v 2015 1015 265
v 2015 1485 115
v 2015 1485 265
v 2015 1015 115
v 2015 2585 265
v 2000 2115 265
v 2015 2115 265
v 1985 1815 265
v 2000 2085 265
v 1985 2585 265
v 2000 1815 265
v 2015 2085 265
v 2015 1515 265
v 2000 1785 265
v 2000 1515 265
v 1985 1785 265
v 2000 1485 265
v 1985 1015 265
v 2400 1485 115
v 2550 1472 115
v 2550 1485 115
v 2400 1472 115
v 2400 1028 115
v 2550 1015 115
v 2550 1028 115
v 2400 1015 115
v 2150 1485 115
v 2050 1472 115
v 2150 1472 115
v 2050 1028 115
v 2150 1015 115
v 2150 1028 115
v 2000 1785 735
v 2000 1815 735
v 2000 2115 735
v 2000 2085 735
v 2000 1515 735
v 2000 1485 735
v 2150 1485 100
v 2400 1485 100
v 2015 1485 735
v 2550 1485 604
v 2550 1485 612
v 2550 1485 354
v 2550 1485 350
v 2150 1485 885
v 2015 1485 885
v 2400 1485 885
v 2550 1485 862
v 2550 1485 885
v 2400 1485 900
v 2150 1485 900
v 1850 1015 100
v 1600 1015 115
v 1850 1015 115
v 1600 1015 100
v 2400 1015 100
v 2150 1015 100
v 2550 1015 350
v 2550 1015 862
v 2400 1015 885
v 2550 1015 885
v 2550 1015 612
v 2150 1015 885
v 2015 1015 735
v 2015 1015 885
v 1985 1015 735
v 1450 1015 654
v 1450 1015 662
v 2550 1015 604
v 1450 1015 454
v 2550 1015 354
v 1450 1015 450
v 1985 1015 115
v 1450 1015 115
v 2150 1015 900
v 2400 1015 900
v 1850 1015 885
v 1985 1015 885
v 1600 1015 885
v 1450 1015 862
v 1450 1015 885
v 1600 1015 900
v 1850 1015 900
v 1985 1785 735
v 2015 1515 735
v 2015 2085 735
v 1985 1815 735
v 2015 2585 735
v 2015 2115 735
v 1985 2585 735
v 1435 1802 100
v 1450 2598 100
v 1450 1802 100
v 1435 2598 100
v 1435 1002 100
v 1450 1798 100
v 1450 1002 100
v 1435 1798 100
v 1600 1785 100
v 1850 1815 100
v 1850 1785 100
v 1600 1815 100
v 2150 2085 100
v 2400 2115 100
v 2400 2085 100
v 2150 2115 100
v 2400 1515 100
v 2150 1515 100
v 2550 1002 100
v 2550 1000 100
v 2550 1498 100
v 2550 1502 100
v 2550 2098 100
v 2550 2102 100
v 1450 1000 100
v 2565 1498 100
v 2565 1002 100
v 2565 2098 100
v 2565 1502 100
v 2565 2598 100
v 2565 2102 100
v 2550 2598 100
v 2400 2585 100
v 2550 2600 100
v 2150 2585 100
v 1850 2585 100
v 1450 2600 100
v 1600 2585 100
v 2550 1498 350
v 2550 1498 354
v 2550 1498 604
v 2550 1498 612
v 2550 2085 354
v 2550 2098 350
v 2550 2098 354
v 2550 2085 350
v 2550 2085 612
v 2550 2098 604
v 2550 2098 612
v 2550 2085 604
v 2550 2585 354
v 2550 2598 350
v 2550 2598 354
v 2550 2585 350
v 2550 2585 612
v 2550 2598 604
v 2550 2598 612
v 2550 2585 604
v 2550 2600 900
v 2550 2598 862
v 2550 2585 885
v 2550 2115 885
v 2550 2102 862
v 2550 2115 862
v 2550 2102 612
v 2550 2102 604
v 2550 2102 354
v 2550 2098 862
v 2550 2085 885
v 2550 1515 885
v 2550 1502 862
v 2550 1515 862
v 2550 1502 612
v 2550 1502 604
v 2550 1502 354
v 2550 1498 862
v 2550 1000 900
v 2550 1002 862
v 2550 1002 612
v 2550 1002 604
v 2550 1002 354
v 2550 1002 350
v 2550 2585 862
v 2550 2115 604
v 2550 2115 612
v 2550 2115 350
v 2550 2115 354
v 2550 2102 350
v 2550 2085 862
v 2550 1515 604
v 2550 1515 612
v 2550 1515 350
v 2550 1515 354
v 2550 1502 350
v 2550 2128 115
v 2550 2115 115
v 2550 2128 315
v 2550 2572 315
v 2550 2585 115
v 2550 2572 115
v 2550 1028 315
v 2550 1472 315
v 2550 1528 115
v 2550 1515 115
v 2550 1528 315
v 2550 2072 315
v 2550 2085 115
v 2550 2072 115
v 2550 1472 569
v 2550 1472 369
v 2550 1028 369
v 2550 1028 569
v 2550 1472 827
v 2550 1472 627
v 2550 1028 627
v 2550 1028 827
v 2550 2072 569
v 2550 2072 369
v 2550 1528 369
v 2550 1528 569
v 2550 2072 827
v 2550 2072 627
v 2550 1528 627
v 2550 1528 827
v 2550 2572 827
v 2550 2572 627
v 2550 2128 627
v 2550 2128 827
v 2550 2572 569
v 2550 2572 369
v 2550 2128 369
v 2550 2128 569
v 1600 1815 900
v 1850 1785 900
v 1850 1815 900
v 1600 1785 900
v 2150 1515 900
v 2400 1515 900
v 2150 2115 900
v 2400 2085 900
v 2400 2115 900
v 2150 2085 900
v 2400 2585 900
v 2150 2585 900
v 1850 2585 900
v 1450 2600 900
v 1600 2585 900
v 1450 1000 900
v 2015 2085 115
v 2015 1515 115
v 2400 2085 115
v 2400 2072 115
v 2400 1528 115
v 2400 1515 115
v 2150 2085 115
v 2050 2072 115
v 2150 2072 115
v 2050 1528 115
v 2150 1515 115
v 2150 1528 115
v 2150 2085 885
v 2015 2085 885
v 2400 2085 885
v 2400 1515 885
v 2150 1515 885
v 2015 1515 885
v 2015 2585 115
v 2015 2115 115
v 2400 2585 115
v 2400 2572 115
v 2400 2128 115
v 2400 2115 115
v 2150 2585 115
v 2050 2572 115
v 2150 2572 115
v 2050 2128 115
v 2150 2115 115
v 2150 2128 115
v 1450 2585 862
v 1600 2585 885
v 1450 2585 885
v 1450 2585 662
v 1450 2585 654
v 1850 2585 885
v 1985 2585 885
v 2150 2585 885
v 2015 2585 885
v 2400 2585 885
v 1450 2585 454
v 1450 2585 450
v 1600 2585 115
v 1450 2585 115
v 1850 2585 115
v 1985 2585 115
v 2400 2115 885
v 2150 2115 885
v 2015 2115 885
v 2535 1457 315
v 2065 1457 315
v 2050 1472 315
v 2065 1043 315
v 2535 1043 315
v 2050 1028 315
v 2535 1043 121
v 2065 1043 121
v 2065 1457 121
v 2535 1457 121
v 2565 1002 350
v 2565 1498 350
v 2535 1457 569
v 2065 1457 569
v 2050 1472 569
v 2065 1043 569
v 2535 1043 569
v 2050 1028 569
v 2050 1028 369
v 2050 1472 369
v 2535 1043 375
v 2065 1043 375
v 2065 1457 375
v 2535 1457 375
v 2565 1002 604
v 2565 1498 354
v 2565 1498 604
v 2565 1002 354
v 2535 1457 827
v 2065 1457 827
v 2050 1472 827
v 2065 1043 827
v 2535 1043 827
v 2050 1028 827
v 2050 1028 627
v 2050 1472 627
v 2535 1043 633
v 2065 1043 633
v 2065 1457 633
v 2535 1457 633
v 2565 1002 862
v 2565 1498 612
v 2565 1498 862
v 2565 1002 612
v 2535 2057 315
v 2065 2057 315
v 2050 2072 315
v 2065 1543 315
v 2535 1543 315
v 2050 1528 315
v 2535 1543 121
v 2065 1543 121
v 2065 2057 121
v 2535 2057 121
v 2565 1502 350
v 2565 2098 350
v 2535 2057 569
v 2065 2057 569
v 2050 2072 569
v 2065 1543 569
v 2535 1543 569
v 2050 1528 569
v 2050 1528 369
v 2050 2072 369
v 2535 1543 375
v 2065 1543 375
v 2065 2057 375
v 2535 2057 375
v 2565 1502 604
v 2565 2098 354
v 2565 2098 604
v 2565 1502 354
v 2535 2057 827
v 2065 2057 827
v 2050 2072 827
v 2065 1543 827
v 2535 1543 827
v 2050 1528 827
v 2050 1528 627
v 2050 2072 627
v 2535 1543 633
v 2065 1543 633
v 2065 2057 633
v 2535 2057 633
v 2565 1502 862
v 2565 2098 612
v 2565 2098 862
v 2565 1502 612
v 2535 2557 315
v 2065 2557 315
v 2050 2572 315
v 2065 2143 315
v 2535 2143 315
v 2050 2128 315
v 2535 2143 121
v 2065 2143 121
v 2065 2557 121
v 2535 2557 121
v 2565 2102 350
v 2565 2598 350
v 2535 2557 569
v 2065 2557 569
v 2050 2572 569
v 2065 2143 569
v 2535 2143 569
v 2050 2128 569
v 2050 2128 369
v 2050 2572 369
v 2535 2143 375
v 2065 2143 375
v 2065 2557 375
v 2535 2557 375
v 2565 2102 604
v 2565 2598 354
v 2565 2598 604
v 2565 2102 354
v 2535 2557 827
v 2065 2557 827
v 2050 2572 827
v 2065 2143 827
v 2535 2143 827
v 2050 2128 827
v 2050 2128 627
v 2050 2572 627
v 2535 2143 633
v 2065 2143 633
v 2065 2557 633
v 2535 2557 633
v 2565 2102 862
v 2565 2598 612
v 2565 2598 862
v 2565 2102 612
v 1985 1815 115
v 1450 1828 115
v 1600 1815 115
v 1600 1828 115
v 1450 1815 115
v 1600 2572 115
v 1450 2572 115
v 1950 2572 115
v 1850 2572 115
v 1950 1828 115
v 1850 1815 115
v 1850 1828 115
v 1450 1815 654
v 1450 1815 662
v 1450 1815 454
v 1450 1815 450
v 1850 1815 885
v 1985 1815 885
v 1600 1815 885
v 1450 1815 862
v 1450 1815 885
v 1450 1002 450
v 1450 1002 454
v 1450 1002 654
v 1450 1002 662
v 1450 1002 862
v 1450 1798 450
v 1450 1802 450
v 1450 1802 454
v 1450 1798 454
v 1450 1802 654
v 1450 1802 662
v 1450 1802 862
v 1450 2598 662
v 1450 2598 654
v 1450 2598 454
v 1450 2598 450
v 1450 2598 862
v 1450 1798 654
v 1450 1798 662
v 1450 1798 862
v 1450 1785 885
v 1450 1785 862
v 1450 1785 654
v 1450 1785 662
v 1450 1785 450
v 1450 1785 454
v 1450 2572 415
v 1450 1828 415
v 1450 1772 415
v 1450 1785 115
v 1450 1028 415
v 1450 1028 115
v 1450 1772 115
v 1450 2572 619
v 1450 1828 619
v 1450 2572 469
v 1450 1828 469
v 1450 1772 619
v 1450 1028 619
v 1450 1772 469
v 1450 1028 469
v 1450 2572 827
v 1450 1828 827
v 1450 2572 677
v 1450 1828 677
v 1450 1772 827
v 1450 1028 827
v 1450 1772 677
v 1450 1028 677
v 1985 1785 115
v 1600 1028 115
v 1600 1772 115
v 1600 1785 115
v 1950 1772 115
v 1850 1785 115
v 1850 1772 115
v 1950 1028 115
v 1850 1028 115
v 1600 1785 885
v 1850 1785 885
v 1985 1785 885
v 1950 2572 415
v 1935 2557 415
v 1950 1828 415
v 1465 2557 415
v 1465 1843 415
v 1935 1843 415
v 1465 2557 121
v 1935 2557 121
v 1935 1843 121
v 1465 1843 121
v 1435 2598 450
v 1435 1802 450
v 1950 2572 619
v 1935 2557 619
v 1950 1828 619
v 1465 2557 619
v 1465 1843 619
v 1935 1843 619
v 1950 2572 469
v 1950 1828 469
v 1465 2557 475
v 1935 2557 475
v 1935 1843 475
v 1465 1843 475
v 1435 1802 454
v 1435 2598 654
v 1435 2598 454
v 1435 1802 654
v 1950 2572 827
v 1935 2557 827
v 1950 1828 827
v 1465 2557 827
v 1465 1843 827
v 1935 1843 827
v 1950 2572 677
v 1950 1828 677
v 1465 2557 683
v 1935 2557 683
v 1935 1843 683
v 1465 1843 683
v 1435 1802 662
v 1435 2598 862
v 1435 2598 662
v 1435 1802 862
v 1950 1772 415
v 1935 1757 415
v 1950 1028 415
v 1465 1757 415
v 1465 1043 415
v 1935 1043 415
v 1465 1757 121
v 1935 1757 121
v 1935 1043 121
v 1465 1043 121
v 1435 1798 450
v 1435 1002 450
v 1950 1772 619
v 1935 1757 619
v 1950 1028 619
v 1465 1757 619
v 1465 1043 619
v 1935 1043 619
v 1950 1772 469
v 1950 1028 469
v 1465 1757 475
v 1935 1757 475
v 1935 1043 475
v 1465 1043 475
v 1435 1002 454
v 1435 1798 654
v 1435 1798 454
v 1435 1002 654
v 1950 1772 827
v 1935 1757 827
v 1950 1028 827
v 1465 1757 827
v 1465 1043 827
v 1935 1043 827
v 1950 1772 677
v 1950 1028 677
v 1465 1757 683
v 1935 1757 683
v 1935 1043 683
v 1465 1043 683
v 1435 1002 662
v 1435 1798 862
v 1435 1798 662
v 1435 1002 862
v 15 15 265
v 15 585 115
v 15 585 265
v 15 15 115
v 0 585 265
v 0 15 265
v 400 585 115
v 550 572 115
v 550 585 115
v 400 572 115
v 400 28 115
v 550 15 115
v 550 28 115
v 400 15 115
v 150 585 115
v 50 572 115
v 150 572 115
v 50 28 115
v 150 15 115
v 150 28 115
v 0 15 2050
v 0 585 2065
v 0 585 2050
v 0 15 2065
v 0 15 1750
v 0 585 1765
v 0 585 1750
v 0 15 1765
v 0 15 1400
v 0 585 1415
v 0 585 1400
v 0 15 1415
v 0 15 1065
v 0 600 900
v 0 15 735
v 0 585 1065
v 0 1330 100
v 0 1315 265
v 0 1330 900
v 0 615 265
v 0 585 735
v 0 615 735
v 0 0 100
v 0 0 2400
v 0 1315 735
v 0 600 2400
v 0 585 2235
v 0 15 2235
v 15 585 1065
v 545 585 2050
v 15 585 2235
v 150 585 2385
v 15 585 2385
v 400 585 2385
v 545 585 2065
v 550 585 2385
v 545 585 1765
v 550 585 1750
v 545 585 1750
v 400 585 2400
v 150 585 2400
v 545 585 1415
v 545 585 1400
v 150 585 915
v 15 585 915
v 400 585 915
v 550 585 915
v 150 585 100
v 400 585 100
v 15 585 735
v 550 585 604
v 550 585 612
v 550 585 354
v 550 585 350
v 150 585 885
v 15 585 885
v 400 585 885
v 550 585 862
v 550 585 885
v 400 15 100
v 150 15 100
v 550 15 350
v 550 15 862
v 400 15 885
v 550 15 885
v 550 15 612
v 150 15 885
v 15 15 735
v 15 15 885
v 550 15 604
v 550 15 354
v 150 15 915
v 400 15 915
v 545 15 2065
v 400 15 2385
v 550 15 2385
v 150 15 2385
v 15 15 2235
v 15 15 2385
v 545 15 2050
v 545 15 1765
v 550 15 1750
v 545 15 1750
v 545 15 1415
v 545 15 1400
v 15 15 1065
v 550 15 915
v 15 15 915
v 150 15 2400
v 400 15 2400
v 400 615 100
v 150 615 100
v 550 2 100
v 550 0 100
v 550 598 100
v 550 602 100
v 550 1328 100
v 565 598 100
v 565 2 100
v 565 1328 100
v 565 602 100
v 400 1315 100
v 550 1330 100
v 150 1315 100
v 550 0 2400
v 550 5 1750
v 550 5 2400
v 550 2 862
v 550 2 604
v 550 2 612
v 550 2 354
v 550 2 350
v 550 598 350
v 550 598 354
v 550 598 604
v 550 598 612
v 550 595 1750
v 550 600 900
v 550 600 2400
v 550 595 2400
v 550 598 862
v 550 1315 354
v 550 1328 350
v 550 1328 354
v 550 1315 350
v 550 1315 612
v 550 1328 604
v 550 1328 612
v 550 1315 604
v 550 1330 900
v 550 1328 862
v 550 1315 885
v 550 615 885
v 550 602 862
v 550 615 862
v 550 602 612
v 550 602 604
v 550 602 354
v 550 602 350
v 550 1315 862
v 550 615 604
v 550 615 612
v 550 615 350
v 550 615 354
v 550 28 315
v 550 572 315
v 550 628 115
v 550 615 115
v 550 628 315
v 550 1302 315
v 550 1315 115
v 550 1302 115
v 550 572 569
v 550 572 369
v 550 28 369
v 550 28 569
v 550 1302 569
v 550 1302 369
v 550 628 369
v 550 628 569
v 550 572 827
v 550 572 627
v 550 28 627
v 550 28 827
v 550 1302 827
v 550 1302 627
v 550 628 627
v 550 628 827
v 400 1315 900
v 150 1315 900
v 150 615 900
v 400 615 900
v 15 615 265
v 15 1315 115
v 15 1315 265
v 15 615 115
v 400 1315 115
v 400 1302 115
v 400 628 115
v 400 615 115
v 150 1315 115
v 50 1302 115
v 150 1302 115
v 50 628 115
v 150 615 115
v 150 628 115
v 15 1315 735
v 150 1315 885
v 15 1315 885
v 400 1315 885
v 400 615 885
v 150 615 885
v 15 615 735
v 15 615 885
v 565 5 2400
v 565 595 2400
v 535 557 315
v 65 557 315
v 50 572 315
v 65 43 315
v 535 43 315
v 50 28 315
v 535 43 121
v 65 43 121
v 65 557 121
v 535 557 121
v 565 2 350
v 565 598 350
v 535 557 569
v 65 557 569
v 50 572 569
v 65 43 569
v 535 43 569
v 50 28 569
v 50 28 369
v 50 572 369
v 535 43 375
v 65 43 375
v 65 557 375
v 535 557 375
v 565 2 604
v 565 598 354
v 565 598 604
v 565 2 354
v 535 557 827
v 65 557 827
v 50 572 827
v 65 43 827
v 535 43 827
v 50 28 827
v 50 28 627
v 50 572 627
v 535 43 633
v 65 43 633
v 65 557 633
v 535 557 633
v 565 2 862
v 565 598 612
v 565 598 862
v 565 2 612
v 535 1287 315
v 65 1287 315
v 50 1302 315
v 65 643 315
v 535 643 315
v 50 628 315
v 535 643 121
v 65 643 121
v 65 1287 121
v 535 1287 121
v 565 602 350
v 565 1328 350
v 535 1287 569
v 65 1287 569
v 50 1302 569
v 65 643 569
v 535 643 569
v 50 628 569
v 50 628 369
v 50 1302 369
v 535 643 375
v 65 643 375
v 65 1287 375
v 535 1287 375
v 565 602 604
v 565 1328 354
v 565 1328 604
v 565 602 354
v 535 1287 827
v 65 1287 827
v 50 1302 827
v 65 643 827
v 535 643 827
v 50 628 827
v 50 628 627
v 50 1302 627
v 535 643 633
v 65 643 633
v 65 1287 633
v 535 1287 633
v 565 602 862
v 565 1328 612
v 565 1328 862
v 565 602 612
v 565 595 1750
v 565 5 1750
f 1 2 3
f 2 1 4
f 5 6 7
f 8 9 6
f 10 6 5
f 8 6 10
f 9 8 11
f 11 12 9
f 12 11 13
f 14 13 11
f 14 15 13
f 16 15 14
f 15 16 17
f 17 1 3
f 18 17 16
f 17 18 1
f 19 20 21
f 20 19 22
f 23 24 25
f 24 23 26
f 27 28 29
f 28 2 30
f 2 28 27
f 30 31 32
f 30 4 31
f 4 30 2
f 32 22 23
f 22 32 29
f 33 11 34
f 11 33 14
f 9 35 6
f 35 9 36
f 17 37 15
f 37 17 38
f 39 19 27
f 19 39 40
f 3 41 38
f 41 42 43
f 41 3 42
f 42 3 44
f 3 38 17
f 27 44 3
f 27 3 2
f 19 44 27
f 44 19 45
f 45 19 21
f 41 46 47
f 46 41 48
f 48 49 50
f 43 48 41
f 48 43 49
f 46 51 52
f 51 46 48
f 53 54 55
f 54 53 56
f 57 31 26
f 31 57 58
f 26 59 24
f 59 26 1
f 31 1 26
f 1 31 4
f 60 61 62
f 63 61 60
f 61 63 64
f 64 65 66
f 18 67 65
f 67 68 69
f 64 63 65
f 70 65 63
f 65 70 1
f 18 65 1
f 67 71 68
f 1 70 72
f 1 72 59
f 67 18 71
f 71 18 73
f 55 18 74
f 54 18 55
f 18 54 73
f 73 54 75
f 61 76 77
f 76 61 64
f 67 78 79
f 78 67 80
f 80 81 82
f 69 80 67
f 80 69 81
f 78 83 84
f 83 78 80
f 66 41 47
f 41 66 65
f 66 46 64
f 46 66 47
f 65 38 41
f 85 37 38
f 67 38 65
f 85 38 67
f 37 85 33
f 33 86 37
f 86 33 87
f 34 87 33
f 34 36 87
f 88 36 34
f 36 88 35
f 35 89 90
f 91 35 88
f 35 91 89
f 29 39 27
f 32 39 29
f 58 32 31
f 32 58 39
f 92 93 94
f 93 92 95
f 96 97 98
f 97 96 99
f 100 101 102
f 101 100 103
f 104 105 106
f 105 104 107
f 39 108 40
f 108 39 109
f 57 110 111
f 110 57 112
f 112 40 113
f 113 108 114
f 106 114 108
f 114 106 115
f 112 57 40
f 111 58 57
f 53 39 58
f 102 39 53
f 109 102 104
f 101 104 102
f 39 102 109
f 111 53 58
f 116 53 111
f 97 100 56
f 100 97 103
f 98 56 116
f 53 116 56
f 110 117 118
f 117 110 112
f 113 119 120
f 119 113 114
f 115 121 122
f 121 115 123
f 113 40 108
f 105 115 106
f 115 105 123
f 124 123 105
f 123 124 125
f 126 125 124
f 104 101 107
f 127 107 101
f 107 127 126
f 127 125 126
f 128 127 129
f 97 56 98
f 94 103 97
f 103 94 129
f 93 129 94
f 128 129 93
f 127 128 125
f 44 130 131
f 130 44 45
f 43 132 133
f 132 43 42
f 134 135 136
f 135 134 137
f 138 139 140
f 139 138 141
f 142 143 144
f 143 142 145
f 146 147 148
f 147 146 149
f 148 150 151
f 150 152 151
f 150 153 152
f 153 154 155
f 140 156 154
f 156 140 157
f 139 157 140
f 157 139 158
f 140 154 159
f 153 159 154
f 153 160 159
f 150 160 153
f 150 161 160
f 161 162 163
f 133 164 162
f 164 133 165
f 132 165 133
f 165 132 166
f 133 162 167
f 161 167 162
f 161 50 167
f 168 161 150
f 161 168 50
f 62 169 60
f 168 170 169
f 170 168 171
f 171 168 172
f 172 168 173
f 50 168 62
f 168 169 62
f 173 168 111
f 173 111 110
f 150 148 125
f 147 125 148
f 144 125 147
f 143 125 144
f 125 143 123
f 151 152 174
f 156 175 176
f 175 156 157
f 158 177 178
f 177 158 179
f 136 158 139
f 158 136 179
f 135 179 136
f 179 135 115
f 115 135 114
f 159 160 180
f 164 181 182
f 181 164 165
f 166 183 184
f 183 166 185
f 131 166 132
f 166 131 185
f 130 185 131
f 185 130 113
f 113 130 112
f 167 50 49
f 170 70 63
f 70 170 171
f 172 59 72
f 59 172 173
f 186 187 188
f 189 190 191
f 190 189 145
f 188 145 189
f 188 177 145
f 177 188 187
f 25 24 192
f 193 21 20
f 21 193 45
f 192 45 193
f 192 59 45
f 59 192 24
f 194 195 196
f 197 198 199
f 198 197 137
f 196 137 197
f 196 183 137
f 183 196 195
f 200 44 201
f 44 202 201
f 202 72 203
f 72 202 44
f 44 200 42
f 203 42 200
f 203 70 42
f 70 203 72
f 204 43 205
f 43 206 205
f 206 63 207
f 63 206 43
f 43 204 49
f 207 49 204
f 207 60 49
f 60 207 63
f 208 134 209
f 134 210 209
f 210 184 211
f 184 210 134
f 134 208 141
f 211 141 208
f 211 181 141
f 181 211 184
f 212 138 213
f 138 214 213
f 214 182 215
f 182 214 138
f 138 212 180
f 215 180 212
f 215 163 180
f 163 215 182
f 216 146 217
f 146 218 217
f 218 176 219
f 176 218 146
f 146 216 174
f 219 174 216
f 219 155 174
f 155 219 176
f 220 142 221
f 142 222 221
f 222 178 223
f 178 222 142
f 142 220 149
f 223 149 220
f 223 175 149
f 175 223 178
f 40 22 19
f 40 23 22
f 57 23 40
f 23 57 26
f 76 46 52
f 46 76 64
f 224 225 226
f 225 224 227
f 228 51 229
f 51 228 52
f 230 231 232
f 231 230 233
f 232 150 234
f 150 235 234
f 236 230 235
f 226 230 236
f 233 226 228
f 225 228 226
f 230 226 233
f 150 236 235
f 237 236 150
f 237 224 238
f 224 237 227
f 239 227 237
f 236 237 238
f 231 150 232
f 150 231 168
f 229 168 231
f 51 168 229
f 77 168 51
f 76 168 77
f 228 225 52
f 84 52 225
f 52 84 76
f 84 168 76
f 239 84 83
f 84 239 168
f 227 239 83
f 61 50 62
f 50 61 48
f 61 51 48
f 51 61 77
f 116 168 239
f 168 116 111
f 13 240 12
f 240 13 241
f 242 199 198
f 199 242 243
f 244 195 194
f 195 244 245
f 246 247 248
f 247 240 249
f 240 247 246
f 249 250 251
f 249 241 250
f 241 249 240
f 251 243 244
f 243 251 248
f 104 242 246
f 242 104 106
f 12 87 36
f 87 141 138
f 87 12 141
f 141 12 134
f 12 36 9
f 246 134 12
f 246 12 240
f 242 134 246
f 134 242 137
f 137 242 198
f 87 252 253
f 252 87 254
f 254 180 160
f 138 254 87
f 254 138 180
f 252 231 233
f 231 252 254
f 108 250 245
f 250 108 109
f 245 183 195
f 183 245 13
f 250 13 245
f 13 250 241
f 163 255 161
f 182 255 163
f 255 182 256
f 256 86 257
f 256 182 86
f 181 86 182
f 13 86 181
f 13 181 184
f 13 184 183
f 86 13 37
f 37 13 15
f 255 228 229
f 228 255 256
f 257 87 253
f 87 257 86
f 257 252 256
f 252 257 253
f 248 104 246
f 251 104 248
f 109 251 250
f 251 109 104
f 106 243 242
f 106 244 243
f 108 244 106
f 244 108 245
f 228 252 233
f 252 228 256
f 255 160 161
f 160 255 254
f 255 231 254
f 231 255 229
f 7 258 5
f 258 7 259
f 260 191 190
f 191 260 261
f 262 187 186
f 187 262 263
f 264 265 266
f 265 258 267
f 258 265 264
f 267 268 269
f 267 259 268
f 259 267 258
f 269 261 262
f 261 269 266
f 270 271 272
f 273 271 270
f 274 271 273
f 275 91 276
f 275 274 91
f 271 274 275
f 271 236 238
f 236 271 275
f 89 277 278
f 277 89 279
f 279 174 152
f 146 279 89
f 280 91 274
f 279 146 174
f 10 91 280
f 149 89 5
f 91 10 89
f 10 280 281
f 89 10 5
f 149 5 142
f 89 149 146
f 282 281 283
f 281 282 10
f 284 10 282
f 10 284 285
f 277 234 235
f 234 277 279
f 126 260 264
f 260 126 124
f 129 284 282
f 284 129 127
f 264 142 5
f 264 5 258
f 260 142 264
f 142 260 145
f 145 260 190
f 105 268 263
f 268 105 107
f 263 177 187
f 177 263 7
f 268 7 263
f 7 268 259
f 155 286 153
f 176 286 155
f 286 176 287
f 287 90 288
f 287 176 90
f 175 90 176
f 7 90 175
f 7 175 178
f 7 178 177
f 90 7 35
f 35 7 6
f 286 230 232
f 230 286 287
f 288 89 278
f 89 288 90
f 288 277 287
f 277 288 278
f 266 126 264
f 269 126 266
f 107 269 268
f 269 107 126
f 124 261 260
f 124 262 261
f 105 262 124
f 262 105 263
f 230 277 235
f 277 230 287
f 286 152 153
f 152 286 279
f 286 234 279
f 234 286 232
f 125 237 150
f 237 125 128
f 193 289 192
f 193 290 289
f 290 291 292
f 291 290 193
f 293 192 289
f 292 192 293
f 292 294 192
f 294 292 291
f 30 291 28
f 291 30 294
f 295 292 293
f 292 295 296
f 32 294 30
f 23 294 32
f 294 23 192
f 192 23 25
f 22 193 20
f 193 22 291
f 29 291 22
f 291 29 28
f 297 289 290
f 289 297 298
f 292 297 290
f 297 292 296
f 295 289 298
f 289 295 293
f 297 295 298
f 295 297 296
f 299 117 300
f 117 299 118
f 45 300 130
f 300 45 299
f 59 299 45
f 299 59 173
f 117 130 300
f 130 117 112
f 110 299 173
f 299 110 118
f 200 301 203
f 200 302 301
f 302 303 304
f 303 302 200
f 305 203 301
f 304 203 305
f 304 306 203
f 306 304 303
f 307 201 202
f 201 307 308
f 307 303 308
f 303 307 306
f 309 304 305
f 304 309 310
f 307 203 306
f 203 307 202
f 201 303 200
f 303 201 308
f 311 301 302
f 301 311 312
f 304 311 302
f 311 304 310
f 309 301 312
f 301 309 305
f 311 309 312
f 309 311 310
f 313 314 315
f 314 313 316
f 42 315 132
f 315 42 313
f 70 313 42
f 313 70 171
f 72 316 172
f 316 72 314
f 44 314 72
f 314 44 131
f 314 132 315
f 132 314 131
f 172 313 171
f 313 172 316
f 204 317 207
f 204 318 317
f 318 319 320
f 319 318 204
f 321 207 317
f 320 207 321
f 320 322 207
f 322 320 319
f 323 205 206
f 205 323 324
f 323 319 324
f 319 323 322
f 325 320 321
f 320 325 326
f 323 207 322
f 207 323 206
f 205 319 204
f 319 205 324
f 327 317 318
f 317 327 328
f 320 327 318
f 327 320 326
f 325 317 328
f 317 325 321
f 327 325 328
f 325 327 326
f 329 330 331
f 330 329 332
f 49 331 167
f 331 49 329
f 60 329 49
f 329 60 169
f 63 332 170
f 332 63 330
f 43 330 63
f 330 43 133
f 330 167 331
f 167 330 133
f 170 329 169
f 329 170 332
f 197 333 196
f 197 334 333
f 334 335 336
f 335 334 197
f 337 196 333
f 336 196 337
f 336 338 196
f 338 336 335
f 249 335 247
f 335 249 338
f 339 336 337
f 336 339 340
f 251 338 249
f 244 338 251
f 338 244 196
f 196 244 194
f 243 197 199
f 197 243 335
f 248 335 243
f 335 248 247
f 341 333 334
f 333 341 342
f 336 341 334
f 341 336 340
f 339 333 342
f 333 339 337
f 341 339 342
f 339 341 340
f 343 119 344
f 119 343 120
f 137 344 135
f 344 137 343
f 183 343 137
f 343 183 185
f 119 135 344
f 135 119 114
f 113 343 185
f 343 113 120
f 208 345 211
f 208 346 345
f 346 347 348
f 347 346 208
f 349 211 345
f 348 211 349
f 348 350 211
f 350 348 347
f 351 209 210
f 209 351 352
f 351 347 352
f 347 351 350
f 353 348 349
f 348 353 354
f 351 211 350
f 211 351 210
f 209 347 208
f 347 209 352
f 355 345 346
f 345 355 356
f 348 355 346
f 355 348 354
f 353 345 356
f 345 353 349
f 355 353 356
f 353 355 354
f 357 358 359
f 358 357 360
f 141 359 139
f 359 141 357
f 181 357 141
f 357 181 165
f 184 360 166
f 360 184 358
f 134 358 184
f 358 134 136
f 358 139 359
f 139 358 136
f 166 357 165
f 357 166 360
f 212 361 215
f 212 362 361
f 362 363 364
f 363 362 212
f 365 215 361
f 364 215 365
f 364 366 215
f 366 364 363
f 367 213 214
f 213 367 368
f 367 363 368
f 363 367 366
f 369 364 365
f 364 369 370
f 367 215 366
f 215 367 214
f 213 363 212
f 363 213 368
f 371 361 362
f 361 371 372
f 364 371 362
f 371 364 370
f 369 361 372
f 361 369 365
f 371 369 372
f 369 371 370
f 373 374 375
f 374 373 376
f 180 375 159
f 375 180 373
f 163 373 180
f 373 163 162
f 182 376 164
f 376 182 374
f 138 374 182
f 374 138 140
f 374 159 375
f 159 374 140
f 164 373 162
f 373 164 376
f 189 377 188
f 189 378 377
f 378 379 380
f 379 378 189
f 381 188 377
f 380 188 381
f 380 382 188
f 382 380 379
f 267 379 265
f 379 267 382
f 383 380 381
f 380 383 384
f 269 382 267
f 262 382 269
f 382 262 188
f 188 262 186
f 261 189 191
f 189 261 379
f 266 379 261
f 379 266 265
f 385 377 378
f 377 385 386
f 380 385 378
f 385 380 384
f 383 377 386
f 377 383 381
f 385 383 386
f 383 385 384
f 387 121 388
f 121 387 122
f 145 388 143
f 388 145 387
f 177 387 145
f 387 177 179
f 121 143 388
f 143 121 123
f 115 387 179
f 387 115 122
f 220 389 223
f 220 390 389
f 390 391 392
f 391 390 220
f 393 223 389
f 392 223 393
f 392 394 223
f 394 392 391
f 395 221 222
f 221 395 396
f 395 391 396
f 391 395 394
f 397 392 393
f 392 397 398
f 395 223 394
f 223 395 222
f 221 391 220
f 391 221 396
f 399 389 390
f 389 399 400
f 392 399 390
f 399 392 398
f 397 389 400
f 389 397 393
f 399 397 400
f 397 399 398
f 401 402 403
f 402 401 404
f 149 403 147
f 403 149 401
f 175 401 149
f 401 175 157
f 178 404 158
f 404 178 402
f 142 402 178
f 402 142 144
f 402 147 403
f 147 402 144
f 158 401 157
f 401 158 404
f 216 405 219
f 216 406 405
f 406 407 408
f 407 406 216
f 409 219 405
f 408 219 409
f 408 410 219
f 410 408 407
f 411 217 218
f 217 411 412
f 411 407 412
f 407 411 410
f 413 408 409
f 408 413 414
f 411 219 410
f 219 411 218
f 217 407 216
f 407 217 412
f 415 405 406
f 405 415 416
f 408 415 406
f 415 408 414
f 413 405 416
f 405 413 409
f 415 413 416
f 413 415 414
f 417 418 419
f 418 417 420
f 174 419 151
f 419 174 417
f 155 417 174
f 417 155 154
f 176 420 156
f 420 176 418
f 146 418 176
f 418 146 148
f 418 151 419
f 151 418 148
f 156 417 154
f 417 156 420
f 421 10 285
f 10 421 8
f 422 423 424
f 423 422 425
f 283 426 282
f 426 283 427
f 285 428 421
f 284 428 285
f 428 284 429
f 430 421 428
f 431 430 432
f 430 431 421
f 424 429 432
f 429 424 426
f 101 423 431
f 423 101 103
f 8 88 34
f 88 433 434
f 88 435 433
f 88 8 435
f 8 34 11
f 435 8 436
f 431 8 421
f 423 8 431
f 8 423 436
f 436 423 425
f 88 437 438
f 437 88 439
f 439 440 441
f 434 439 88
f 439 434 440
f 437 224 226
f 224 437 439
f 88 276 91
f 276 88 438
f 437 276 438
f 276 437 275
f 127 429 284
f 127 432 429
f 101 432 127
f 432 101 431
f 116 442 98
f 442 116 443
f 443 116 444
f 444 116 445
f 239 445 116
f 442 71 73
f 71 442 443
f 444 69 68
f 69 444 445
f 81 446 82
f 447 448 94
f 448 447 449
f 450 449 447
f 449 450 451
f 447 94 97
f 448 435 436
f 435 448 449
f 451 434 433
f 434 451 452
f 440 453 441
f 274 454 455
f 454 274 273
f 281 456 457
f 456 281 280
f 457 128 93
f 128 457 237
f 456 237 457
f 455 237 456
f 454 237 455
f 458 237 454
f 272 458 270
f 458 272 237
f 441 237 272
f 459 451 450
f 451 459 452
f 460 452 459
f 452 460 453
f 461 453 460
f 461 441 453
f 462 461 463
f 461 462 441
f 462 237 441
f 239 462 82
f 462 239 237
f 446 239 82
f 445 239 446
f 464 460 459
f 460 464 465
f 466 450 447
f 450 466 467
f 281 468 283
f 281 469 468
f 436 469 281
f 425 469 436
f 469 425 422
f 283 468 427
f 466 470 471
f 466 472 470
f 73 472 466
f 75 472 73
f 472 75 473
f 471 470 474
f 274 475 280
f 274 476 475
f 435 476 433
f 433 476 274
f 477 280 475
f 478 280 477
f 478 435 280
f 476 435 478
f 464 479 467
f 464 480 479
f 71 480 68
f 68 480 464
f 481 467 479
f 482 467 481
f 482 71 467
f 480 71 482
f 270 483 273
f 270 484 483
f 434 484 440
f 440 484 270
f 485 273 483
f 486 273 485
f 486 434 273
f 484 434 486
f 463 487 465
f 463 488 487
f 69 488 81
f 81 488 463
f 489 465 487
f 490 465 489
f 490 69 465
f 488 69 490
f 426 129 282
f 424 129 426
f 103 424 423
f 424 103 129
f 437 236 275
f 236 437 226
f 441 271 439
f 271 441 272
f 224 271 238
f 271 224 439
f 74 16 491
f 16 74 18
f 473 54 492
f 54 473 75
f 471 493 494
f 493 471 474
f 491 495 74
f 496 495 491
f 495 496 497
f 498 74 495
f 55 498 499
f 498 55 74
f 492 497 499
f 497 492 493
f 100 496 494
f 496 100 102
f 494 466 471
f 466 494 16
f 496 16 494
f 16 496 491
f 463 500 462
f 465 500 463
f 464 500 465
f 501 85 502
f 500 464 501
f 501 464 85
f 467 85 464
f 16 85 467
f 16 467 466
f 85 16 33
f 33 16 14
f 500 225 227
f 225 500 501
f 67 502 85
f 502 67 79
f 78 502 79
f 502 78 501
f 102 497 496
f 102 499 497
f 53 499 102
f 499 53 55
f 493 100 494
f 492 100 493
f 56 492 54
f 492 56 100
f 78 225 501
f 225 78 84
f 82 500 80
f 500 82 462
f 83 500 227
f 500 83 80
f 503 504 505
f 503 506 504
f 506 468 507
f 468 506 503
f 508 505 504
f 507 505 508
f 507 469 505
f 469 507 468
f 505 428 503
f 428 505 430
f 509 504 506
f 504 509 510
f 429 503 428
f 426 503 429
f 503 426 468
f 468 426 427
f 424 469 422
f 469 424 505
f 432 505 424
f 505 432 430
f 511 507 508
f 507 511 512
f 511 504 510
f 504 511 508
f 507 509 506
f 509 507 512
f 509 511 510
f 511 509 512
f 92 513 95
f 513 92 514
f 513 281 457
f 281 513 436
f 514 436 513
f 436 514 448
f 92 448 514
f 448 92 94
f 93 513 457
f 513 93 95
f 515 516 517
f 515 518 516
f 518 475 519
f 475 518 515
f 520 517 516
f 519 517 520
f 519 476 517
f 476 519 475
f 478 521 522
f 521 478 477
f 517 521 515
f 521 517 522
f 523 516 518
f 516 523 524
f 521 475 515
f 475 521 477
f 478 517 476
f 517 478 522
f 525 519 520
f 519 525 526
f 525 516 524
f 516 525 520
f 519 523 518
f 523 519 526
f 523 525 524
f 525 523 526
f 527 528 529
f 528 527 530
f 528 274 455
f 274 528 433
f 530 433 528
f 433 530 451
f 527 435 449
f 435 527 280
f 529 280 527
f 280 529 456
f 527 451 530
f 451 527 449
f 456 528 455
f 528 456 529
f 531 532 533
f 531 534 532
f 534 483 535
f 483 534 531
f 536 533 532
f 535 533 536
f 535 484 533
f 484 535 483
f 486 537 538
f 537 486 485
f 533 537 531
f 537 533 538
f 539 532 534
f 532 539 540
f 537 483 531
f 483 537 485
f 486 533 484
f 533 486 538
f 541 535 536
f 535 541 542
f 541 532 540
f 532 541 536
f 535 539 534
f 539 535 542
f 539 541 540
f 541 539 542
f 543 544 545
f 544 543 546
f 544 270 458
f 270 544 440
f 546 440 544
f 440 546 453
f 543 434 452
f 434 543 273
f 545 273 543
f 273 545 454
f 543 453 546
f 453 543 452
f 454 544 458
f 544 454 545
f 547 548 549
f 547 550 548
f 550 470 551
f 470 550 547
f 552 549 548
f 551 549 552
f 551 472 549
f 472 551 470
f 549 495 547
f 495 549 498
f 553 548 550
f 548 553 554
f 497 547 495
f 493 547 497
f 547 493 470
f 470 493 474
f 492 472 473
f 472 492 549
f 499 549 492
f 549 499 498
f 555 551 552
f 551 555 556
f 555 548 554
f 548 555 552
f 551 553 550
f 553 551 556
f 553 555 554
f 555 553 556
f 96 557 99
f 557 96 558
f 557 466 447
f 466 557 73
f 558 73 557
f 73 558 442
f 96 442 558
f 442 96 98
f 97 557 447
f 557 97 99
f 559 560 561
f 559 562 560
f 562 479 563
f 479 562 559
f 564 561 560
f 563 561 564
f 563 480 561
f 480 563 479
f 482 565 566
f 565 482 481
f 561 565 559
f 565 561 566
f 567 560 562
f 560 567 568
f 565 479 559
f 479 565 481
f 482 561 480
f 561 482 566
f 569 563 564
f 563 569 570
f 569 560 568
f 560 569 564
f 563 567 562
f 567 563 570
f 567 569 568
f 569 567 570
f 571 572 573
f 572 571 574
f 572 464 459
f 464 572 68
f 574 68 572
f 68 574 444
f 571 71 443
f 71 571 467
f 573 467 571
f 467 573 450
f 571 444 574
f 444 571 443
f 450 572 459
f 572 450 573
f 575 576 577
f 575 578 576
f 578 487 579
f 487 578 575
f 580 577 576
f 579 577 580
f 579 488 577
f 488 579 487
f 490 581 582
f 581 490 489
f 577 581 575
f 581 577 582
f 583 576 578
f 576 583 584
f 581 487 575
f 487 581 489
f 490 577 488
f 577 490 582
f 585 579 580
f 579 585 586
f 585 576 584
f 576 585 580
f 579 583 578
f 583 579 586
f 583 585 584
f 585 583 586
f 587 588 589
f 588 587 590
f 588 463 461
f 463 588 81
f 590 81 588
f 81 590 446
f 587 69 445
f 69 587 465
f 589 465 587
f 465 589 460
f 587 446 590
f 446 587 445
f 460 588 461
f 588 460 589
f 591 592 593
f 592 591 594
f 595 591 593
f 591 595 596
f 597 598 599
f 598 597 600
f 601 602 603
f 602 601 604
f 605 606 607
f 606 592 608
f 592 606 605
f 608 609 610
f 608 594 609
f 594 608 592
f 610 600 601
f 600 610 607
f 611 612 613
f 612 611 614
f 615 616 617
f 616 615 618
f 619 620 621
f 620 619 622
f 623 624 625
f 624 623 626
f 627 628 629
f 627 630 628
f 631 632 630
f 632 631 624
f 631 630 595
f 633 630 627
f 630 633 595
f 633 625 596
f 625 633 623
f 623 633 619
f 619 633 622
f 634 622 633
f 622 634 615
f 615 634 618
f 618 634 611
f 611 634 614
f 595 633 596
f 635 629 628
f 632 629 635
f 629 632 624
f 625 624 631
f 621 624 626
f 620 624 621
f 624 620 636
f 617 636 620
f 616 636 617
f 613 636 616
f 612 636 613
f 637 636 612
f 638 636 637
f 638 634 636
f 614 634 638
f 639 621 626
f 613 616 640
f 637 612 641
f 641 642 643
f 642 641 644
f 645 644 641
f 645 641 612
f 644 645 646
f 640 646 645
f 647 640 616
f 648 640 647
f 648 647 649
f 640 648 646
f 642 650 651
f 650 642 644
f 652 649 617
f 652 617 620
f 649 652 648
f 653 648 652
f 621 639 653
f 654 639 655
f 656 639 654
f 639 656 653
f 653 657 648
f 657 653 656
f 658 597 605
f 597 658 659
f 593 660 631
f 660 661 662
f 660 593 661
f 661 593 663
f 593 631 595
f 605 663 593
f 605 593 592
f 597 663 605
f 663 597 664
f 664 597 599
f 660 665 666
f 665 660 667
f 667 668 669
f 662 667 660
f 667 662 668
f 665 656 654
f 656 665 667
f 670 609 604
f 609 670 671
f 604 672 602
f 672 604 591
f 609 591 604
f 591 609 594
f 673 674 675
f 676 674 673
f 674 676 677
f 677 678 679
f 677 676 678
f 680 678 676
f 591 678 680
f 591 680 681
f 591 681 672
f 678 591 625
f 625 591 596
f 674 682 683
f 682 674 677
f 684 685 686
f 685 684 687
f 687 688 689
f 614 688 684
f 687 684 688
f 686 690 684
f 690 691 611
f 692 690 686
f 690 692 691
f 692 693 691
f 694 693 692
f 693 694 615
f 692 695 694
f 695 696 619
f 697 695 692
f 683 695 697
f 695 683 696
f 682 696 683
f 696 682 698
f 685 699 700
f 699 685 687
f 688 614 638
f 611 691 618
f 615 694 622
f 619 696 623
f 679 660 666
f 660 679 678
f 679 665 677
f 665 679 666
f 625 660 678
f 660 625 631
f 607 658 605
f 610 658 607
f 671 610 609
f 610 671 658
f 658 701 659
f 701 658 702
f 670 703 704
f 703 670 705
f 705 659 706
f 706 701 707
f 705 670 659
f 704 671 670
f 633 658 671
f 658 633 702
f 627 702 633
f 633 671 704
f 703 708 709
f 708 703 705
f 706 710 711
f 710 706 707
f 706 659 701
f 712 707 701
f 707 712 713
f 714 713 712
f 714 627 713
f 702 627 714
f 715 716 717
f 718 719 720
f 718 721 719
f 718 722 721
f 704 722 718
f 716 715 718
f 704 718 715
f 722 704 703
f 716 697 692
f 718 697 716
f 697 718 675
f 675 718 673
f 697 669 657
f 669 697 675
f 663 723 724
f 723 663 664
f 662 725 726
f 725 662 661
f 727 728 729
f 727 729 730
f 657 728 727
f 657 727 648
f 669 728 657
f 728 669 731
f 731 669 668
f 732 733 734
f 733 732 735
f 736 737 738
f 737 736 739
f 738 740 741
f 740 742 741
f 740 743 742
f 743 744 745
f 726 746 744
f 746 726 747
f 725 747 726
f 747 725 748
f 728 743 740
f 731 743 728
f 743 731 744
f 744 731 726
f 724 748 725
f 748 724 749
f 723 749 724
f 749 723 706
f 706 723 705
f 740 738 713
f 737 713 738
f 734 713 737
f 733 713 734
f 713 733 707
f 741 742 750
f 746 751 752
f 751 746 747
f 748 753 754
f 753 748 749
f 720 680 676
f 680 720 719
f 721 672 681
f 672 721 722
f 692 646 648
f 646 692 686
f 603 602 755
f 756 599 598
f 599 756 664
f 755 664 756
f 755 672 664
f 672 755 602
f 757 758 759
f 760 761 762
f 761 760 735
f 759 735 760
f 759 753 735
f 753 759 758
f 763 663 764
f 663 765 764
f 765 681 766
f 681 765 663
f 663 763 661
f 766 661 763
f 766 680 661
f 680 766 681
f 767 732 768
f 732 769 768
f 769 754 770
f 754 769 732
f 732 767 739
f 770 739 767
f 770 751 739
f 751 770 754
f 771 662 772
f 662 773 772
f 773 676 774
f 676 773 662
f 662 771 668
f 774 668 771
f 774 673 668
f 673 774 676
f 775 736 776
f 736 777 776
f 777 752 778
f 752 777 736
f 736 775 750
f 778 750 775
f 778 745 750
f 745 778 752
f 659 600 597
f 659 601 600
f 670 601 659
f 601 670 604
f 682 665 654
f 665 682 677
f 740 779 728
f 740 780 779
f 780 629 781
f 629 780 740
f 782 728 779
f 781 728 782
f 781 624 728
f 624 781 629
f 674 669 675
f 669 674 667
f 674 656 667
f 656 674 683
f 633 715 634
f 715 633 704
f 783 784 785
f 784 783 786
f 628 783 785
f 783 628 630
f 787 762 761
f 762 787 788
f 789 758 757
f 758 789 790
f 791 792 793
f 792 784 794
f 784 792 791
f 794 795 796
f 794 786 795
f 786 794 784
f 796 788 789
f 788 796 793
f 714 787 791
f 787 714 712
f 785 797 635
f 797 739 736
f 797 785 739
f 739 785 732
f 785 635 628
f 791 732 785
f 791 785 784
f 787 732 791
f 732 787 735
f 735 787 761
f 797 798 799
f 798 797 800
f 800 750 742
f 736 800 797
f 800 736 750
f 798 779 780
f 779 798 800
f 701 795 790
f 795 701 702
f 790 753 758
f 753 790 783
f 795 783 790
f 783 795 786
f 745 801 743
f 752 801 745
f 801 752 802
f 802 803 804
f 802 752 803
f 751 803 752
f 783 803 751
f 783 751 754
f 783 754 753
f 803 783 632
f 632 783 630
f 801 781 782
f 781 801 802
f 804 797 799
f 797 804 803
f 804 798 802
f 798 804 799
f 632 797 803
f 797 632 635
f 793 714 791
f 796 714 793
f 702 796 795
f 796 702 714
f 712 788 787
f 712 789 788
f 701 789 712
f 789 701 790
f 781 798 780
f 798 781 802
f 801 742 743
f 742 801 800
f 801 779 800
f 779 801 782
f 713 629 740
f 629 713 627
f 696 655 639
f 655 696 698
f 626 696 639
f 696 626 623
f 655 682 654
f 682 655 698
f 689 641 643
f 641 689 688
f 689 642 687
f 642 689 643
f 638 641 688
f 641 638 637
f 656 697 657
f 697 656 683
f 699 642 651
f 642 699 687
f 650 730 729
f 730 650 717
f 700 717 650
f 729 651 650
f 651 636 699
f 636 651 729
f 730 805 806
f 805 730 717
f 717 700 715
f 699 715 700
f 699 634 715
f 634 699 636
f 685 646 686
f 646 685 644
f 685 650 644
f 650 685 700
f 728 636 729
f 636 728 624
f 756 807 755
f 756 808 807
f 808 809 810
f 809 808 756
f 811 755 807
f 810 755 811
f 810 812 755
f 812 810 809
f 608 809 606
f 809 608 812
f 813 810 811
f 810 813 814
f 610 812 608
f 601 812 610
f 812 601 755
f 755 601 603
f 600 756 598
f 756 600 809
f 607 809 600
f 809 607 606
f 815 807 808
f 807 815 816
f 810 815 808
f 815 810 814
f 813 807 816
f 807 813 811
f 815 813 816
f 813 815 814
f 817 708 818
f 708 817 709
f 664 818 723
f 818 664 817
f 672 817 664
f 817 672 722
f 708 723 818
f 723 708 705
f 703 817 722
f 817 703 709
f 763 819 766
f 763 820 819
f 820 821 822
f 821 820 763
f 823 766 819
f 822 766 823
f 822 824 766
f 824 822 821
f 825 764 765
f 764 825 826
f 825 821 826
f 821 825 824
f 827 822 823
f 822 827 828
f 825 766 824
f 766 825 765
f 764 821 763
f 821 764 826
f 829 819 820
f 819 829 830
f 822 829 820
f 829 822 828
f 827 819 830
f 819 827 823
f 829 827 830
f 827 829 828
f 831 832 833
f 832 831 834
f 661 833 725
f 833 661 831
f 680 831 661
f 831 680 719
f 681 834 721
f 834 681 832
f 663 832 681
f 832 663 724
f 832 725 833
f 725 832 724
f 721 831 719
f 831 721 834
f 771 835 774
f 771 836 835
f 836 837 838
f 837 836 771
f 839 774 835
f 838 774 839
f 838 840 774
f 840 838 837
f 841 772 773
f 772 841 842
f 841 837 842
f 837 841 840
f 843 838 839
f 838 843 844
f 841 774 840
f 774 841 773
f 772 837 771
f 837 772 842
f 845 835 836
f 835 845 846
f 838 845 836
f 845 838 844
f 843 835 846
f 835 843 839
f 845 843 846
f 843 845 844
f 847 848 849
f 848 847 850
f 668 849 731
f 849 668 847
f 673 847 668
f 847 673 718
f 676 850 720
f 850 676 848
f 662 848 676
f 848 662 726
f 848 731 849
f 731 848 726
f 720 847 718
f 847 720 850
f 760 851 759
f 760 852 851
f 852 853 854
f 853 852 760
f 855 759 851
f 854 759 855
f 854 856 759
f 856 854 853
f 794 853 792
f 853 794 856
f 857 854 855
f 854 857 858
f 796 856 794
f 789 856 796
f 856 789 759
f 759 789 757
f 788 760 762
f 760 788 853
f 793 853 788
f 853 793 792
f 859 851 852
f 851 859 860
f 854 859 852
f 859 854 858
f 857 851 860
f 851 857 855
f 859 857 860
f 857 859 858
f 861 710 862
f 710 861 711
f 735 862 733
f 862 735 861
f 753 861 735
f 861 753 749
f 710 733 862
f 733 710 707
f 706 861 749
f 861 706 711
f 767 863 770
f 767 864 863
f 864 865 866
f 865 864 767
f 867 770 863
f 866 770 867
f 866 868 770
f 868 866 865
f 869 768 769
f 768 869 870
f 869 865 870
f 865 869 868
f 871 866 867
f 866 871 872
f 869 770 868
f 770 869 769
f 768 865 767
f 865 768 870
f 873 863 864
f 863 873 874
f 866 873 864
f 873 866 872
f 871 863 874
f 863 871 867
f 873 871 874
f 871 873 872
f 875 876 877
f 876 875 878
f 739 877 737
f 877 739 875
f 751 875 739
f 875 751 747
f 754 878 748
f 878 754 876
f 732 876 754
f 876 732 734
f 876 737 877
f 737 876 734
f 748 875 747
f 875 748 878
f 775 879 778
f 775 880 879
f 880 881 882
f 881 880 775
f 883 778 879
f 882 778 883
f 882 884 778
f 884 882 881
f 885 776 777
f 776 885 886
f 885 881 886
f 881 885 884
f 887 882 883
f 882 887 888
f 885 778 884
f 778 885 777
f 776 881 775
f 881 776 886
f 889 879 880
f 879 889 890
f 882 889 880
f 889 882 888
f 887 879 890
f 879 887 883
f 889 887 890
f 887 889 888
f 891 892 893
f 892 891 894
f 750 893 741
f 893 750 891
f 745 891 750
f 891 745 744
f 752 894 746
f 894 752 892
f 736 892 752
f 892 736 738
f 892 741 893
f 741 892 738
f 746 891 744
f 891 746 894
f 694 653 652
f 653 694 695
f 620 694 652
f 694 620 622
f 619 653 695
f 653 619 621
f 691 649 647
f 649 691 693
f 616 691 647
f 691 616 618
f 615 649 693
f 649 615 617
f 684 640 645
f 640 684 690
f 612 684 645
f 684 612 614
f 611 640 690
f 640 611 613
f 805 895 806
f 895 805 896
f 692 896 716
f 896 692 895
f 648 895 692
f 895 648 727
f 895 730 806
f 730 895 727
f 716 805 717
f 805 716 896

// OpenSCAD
use <cajoneriaLibV1.scad>

espesor = 15; riel = 13;
socalo = 100;
// modulo(i) = [
//    ancho, alto, profundidad,
//    refuerzo, esqueleto, fondo, espesor,
//    color, [x,y+sum(modulo(i..i-1)[ancho]),z], nombre
//]
// Modulos Isla
mod_00 = [500,800,550,"No","Si","No",espesor,"red",
         [0,0,socalo], "Mod_Isla 1"];
mod_01 = [600,800,550,"No","Si","No",espesor,"red",
         [0,mod_00[0],socalo], "Mod_Isla 2"];
mod_02 = [500,800,550,"No","Si","No",espesor,"red",
         [0,mod_00[0]+mod_01[0],socalo], "Mod_Isla 3"];
         
mod_03 = [800,800,550,"No","Si","No",espesor,"red",
         [0,0,socalo], "Mod_Isla 4"];
mod_04 = [800,800,550,"No","Si","No",espesor,"red",
         [0,mod_03[0],socalo], "Mod_Isla 5"];         
         
Modulos_01 = [mod_00, mod_01, mod_02 ];
Modulos_02 = [mod_03, mod_04 ];

// modulos Columna-Cocina

mod_05 = [600,800,550,"No","Si","No",espesor,"red",
         [0,0,socalo], "Mod_Torre 1"];

mod_06 = [730,800,550,"No","Si","No",espesor,"red",
         [0,mod_05[0],socalo], "Mod_Cocina"];

mod_07 = [600,1500,550,"No","Si","No",espesor,"red",
         [0,0,mod_05[1]+socalo], "Mod_Torre 2"];

Modulos_03 = [mod_05, mod_06, mod_07 ];

// puerta = [moduloIndex, ancho, alto, cant, espesor, 
//    color, [x,y,z]], nombre
//]

puerta_00 = [7,mod_07[0]-10,650,1,espesor,"green",
            [mod_07[8][0]+mod_07[2],
                mod_07[8][1]+5,
                mod_07[8][2]+850], 
            "puerta 1"];
puerta_01 = [1,mod_01[0]-10,mod_01[1]-10,1,espesor,"green",
            [mod_01[8][0]+mod_01[2],
                mod_01[8][1]+5,
                mod_01[8][2]], 
            "puerta 2"];
PuertasX = [
        puerta_00, //puerta_01
    ];

div_00 = [7,mod_07[0]-10,mod_07[2]-5,1,espesor,"green",
            [mod_07[8][0],
                mod_07[8][1]+5,
                mod_07[8][2]+500], 
            "division 1"];
div_01 = [7,mod_07[0]-10,mod_07[2]-5,1,espesor,"green",
            [mod_07[8][0],
                mod_07[8][1]+5,
                mod_07[8][2]+850], 
            "division 2"];
            
div_02 = [7,mod_07[0]-10,mod_07[2]-5,1,espesor,"green",
            [mod_07[8][0],
                mod_07[8][1]+5,
                mod_07[8][2]+1150], 
            "division 2"];
            
Divisiones = [
            div_00, div_01, div_02
];

//armario_00 = [moduloIndex, ancho, alto, profundidad,
//            espesor, color, divisiones, [x,y,z]];

armario_00 = [2, mod_02[0]-espesor*2, 500, mod_02[2]-espesor-6,
            espesor, "white", (1+2),
            [mod_02[8][0]+espesor*2,
                mod_02[8][1]+espesor,
                mod_02[8][2]+150],
            "Armario 1"];

socalo_00 = [0, 500, 2400, socalo,
            espesor, "white", (4+2),
            [0,0,0],
            "Socalo 1"];

// cajon_00 = [moduloIndex, ancho, alto, profundidad,
//          espesor, color, frenteDec, anchoDec, altoDec, 
//          colorDec, [x,y,z]]
esp_riel = espesor*2+riel*2;
altoCajon1 = 200;
cajon_00 = [0, mod_00[0]-esp_riel, altoCajon1, mod_00[2]-50,
          espesor, "blue", "Si", mod_00[0]-4, 
          altoCajon1+50,"green", 
          [mod_00[8][0]+50,
            mod_00[8][1]+espesor+riel,
            mod_00[8][2]+espesor]];
            
cajon_01 = [0, mod_00[0]-esp_riel, altoCajon1, mod_00[2]-50,
          espesor, "red", "Si", mod_00[0]-4, 
          altoCajon1+50,"green", 
          [mod_00[8][0]+50,
            mod_00[8][1]+espesor+riel,
            mod_00[8][2]+espesor+altoCajon1+50+2*2]];

cajon_02 = [0, mod_00[0]-esp_riel, altoCajon1, mod_00[2]-50,
          espesor, "red", "Si", mod_00[0]-4, 
          altoCajon1+50,"green", 
          [mod_00[8][0]+50,
            mod_00[8][1]+espesor+riel,
            mod_00[8][2]+espesor+(altoCajon1+50)*2+2*3+6]];
///////
cajon_03 = [1, mod_01[0]-esp_riel, altoCajon1, mod_01[2]-50,
          espesor, "blue", "Si", mod_01[0]-4, 
          altoCajon1+50,"green", 
          [mod_01[8][0]+50,
            mod_01[8][1]+espesor+riel,
            mod_01[8][2]+espesor]];
            
cajon_04 = [1, mod_01[0]-esp_riel, altoCajon1, mod_01[2]-50,
          espesor, "red", "Si", mod_01[0]-4, 
          altoCajon1+50,"green", 
          [mod_01[8][0]+50,
            mod_01[8][1]+espesor+riel,
            mod_01[8][2]+espesor+altoCajon1+50+2*2]];

cajon_05 = [1, mod_01[0]-esp_riel, altoCajon1, mod_01[2]-50,
          espesor, "red", "Si", mod_01[0]-4, 
          altoCajon1+50,"green", 
          [mod_01[8][0]+50,
            mod_01[8][1]+espesor+riel,
            mod_01[8][2]+espesor+(altoCajon1+50)*2+2*3+6]];
//////
cajon_06 = [1, mod_02[0]-esp_riel, altoCajon1, mod_02[2]-50,
          espesor, "blue", "Si", mod_02[0]-4, 
          altoCajon1+50,"green", 
          [mod_02[8][0]+50,
            mod_02[8][1]+espesor+riel,
            mod_02[8][2]+espesor]];
            
cajon_07 = [1, mod_02[0]-esp_riel, altoCajon1, mod_02[2]-50,
          espesor, "red", "Si", mod_02[0]-4, 
          altoCajon1+50,"green", 
          [mod_02[8][0]+50,
            mod_02[8][1]+espesor+riel,
            mod_02[8][2]+espesor+altoCajon1+50+2*2]];

cajon_08 = [1, mod_02[0]-esp_riel, altoCajon1, mod_02[2]-50,
          espesor, "red", "Si", mod_02[0]-4, 
          altoCajon1+50,"green", 
          [mod_02[8][0]+50,
            mod_02[8][1]+espesor+riel,
            mod_02[8][2]+espesor+(altoCajon1+50)*2+2*3+6]];


Cajones_00 = [
    cajon_00, cajon_01, cajon_02,
    cajon_03, cajon_04, cajon_05,
    cajon_06, cajon_07, cajon_08,
];

altoCajon2 = 300;
altoCajon3 = 150;
cajon_09 = [0, mod_03[0]-esp_riel, altoCajon2, mod_03[2]-50,
          espesor, "blue", "Si", mod_03[0]-4, 
          altoCajon2+50,"green", 
          [mod_03[8][0]+50,
            mod_03[8][1]+espesor+riel,
            mod_03[8][2]+espesor]];
            
cajon_10 = [0, mod_03[0]-esp_riel, altoCajon3, mod_03[2]-50,
          espesor, "red", "Si", mod_03[0]-4, 
          altoCajon3+50,"green", 
          [mod_03[8][0]+50,
            mod_03[8][1]+espesor+riel,
            mod_03[8][2]+espesor+altoCajon2+50+2*2]];
cajon_11 = [1, mod_03[0]-esp_riel, altoCajon3, mod_03[2]-50,
          espesor, "red", "Si", mod_03[0]-4, 
          altoCajon3+50,"green", 
          [mod_03[8][0]+50,
            mod_03[8][1]+espesor+riel,
            mod_03[8][2]+espesor+altoCajon3+altoCajon2+50*2+2*3+6]];
////////
cajon_12 = [4, mod_04[0]-esp_riel, altoCajon2, mod_04[2]-50,
          espesor, "blue", "Si", mod_04[0]-4, 
          altoCajon2+50,"green", 
          [mod_04[8][0]+50,
            mod_04[8][1]+espesor+riel,
            mod_04[8][2]+espesor]];
            
cajon_13 = [0, mod_04[0]-esp_riel, altoCajon3, mod_04[2]-50,
          espesor, "red", "Si", mod_04[0]-4, 
          altoCajon3+50,"green", 
          [mod_04[8][0]+50,
            mod_04[8][1]+espesor+riel,
            mod_04[8][2]+espesor+altoCajon2+50+2*2]];
cajon_14 = [1, mod_04[0]-esp_riel, altoCajon3, mod_04[2]-50,
          espesor, "red", "Si", mod_04[0]-4, 
          altoCajon3+50,"green", 
          [mod_04[8][0]+50,
            mod_04[8][1]+espesor+riel,
            mod_04[8][2]+espesor+altoCajon3+altoCajon2+50*2+2*3+6]];

Cajones_01 = [
    cajon_09, cajon_10, cajon_11,
    cajon_12, cajon_13, cajon_14,
    
];
/// Cajones torre
cajon_15 = [5, mod_05[0]-esp_riel, altoCajon1, mod_05[2]-50,
          espesor, "blue", "Si", mod_05[0]-4, 
          altoCajon1+50,"green", 
          [mod_05[8][0]+50,
            mod_05[8][1]+espesor+riel,
            mod_05[8][2]+espesor]];
            
cajon_16 = [5, mod_05[0]-esp_riel, altoCajon1, mod_05[2]-50,
          espesor, "red", "Si", mod_05[0]-4, 
          altoCajon1+50,"green", 
          [mod_05[8][0]+50,
            mod_05[8][1]+espesor+riel,
            mod_05[8][2]+espesor+altoCajon1+50+2*2]];

cajon_17 = [5, mod_05[0]-esp_riel, altoCajon1, mod_05[2]-50,
          espesor, "red", "Si", mod_05[0]-4, 
          altoCajon1+50,"green", 
          [mod_05[8][0]+50,
            mod_05[8][1]+espesor+riel,
            mod_05[8][2]+espesor+(altoCajon1+50)*2+2*3+6]];
// Cajones modulo cocina
cajon_18 = [6, mod_06[0]-esp_riel, altoCajon1, mod_06[2]-50,
          espesor, "blue", "Si", mod_06[0]-4, 
          altoCajon1+50,"green", 
          [mod_06[8][0]+50,
            mod_06[8][1]+espesor+riel,
            mod_06[8][2]+espesor]];
            
cajon_19 = [6, mod_06[0]-esp_riel, altoCajon1, mod_06[2]-50,
          espesor, "red", "Si", mod_06[0]-4, 
          altoCajon1+50,"green", 
          [mod_06[8][0]+50,
            mod_06[8][1]+espesor+riel,
            mod_06[8][2]+espesor+altoCajon1+50+2*2]];

cajon_20 = [6, mod_06[0]-esp_riel, altoCajon1, mod_06[2]-50,
          espesor, "red", "Si", mod_06[0]-4, 
          altoCajon1+50,"green", 
          [mod_06[8][0]+50,
            mod_06[8][1]+espesor+riel,
            mod_06[8][2]+espesor+(altoCajon1+50)*2+2*3+6]];

Cajones_02 = [
    cajon_15, cajon_16, cajon_17,
    cajon_18, cajon_19, cajon_20,
    
];

translate([2000,1000,0])
union(){
    echo("Inicia Isla");
    union(){
        modulosdeCocina(Modulos_01);
        cajonesdeModulo(Cajones_00);
        }
    translate([0,1600,0]) rotate([0,0,180])    
    union(){
        modulosdeCocina(Modulos_02);
        cajonesdeModulo(Cajones_01);
    }
    echo("Fin Isla");
}
union(){
        modulosdeCocina(Modulos_03);
        cajonesdeModulo(Cajones_02);
        divHorizontal(Divisiones); 
        puertasdeModulo(PuertasX);
    }




//armariodeModulo(armario_00);

//socalo(socalo_00);
